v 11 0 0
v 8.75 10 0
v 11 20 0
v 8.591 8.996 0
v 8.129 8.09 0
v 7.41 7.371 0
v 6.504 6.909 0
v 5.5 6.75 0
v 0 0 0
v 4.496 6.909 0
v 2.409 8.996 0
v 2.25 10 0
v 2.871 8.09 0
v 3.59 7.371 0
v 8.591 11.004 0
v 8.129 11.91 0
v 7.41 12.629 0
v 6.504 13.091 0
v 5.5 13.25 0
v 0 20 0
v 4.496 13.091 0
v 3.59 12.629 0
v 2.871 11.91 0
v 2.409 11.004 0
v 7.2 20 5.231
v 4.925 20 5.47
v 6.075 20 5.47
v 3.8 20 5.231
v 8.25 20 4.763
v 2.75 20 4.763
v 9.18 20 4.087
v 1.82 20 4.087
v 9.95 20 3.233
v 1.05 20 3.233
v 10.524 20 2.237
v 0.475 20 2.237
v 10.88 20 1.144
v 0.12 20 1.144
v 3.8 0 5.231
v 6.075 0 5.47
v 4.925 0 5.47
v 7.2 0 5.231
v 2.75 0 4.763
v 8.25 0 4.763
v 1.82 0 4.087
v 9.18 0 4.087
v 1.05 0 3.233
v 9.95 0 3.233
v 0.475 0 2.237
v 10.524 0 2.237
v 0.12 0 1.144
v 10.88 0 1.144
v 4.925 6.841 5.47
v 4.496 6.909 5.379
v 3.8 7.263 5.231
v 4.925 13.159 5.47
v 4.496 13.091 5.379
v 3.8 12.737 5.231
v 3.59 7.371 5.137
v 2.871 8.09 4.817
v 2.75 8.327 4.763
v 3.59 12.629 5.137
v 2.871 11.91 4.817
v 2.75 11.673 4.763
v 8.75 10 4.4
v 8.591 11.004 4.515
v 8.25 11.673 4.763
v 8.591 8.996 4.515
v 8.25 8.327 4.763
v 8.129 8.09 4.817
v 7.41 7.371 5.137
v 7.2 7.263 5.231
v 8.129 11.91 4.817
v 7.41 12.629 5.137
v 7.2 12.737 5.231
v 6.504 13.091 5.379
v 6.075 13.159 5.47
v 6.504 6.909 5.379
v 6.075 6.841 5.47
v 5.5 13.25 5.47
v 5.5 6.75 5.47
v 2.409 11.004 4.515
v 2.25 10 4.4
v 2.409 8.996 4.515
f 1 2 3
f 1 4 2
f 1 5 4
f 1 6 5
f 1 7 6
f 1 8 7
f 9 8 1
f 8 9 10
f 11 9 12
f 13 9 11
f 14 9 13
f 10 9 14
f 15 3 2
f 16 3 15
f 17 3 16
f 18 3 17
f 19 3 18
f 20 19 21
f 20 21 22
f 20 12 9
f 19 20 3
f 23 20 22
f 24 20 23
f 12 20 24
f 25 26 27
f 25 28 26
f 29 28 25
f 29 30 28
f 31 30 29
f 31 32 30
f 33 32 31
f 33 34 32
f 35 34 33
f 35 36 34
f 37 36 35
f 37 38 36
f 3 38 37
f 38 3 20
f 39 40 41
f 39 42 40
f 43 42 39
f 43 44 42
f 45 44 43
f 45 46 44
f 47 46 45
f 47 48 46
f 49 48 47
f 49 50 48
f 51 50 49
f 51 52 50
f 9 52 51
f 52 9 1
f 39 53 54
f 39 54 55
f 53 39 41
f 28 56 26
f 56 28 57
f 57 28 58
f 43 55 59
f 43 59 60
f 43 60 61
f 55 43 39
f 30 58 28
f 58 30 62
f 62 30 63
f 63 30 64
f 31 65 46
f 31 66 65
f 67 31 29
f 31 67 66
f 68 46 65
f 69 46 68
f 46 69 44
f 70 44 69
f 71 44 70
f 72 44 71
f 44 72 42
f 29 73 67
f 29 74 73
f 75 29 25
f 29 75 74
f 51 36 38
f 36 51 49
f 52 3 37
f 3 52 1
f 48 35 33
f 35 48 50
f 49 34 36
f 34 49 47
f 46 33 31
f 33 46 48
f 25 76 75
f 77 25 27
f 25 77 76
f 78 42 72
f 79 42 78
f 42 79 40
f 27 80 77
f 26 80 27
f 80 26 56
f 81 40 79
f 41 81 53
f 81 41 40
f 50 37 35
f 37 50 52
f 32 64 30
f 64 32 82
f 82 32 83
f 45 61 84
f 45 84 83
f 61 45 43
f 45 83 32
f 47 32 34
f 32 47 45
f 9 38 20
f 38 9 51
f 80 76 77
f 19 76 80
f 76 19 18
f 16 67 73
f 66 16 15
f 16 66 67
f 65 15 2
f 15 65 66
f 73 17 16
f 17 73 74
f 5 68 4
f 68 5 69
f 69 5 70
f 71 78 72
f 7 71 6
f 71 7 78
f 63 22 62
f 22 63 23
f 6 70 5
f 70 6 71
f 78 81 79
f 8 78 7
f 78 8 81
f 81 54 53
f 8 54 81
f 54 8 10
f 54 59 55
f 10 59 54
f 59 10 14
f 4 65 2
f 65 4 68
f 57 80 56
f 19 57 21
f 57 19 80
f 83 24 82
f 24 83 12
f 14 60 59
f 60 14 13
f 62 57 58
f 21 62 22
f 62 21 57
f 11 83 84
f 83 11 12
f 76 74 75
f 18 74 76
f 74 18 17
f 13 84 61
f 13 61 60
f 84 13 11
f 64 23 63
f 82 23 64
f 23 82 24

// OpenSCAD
// preview[view:south west, tilt:diagonal]
/* [General] */

part="vclamp_rod"; // [clamp_tray:Clamp Tray,rod_tray:Rod Dray,dual_tray:Dual Tray,hclamp:Flat(H) Clamp,vclamp:V-Clamp,tvclamp:Tall V-Clamp,vclamp_rod:V-Clamp Rod,presser:Presser,grip:Grip,preview:Preview All]
// Bolt Diameter
boltd=6.0; // [3:M3,4:M4,5:M5,6:M6,7:M7,8:M8,3.175:1/8",4.7625:3/16",6.35:1/4",7.9375:5/16",9.525:3/8",11.1125:7/16",12.7:1/2"]

/* [Flat Clamp] */

// Flat Clamp Width (X)
hcw=80; // [40:120]
// Flat Clamp Height (Y)
hch=20; // [10:40]
// Flat Clamp Depth (Z)
hcd=6; // [4:0.1:20]
// Flat Clamp Extra Notch
hnotch=1; // [1:Yes,2:No]

/* [V-Clamp] */

// V-Clamp Width (X)
vcw=76; // [40:120]
// V-Clamp Height (Y)
vch=20; // [10:40]
// V-Clamp Depth
vcd=16; // [10:0.1:40]
// V-Clamp Rod diameter
vcrd=12; // [10:20]

/* [Others] */

// Clamp Tray Count
ctray_count=12; // [1:20]

// Grip Big Diameter
gripd=40; // [20:60]

if(part=="clamp_tray")
    clamp_tray();
else if(part=="dual_tray")
{
  clamp_tray();
  translate([ctray_count*9,0])
    m4_tray(left=0);
} else if(part=="rod_tray") {
  m4_tray();
} else if(part=="vclamp_rod") {
  vclamp_rod();
} else if(part=="hclamp")
{
  translate([0,0,hcd]) mirror([0,0,1]) hclamp();
} else if(part=="vclamp")
{
  translate([0,0,vch]) rotate([-90,0])
  vclamp();
} else if(part=="tvclamp") {
   rotate([90,0]) tvclamp();
} else if(part=="presser") {
  mirror([0,0,1]) presser();
} else if(part=="grip")
{
  grip(gripd);
} else if(part=="preview")
{
  color("lightblue") clamp_tray();
  color("lightgreen") translate([ctray_count*9,0]) m4_tray(left=0);
  color("yellow") for(x=[0:(ctray_count-1)/2-2]) {
    translate([8.5+x*9,2.5,hcw+2]) rotate([0,-90,0]) mirror([1,0]) hclamp();
  }
  color("red") for(x=[0:2]) {
    translate([((ctray_count-1)/2-2)*9+20+x*18,2.5,2.5]) rotate([0,-78]) vclamp();
  }
  for(x=[0:1:4],y=[0:1]) {
    if(x%2!=y%2)
    translate([ctray_count*9+6+x*10,6+y*12])
    {
      color("silver") cylinder(d=4,h=50,$fn=20);
      translate([0,0,25+x*5+y*10-(x==4?5:0)])
      {
        color("gray") mirror([0,0,1]) rotate([0,0,30]) grip();
        if(x>2)
          color("pink") translate([(vcrd-1)*-.5,vch*-.5,-15]) mirror([0,0,1]) vclamp_rod();
      }
    }
  }
}
module clamp_tray() {
  difference() {
    box([2+ctray_count*9,25,20],bottom=0,r=2);
    for(x=[0:ctray_count-1]) {
      translate([2+x*9,2,2]) cube([7,21,20]);
    }
  }
}  
module m4_tray(left=1) {
  difference(){
    union(){
      translate([0,0]) box([52,25,18],left=left,bottom=0,r=2);
      *translate([115,0,4]) {
        for(x=[0:6],y=[0:1]){
          translate([x*10,6+y*12]) cylinder(d=7,h=16,$fn=20);
        }
      }
    }
    translate([6,0,4]) {
      for(x=[0:4],y=[0:1]){
        translate([x*10,6+y*12]) cylinder(d=boltd+.5,h=20,$fn=20);
      }
    }
  }
}
module presser() {
  difference(){
    union() {
      sphere(d=13+boltd,$fn=50);
    }
    translate([0,0,boltd>5?-2:0])
      cylinder(d=boltd+.2,h=20,$fn=20);
    translate([0,0,boltd>5?1:3])
      cylinder(d=boltd*2+.2,h=30,$fn=6);
    translate([-10,-10,5])
      cube(20);
  }
}
module tvclamp() {
  tvh=48;
  difference(){
    union() {
      box([vcw-20,vcd,4],front=0);
      translate([vcw-24,0]) box([4,vcd,tvh],front=0);
      translate([vcw-24,0,tvh-5]) box([24,vcd,5],front=0);
      translate([vcw-24,0,tvh-24]) intersection() {
        rotate([0,-45]) box([40,2,40],r=1,front=0);
          box([24,2,24],r=1,front=0);
      }
      translate([vcw-60,0,0]) intersection() {
        rotate([0,45]) box([60,2,60],r=1,front=0);
          box([40,2,40],r=1,front=0);
      }
    }
    *translate([vcw-20,-.01,tvh-4])
      rotate([0,90,0]) cube([80,vcd+.02,30]);
    *translate([-.01,-.01,4]) cube([50,vcd+.02,80]);
    translate([vcw-vcd/2,vcd/2,0]) {
      cylinder(d=4,h=tvh+.02,$fn=20);
      translate([0,0,tvh-5]) rotate([0,0,30]) cylinder(d=8.2,h=3,$fn=6);
    }
    for(x=[vcd/2:16:44]) {
      translate([x,vcd/2,-.01]) cylinder(d=4,h=5,$fn=20);
    }
  }
  %translate([vcw-vcd/2,vcd/2,tvh-15]) presser();
}
module box(size,r=1,top=1,bottom=1,left=1,right=1,front=1,back=1)
{
  w=size[0];
  d=size[1];
  h=size[2];
  intersection(){
    cube([w,d,h]);
    minkowski(){
      translate([left?r:0,front?r:0,bottom?r:0]) cube([w-(left?r:0)-(right?r:0),d-(front?r:0)-(back?r:0),h-(top?r:0)-(bottom?r:0)]);
      sphere(r,$fn=30);
    }
  }
}
module rounded_rect(w,h,r) {
  translate([r,r]) circle(d=r*2,$fn=30);
  translate([r,h-r]) circle(d=r*2,$fn=30);
  translate([w-r,h-r]) circle(d=r*2,$fn=30);
  translate([w-r,r]) circle(d=r*2,$fn=30);
  translate([r,0]) square([w-r*2,h]);
  translate([0,r]) square([r,h-r*2]);
  translate([w-r,r]) square([r,h-r*2]);
}
module rounded_cube(dims,rsides=2,rvert=0)
{
  w=dims[0];
  h=dims[1];
  d=dims[2];
  if(rvert==0)
  {
    linear_extrude(d) rounded_rect(w,h,rsides);
  } else {
    translate([rsides,rsides,rvert]) scale([1,1,rvert/rsides]) minkowski() {
      cube([w-rsides*2,h-rsides*2,(d-rvert*2)/(rvert/rsides)]);
      sphere(rsides,$fn=30);
    }
  }
}
module hclamp() {
  difference(){
    rounded_cube([hcw,hch,hcd],8);
    translate([3+boltd,-.01]) mirror([1,0]) rotate([0,60]) cube([10,hch+.02,20]);
    if(hnotch)
      translate([-.01,-.01,hcd-1]) mirror([0,0,1]) cube([3,hch,hcd]);
    translate([0,3,-.01]) mirror([0,1,0]) rotate([0,0,10]) cube(20);
    translate([0,hch-3,-.01]) rotate([0,0,10]) cube(20);
    translate([5+boltd,hch/2-boltd/2-.2,-.01]) rounded_cube([hcw-13-boltd*2,boltd+.4,8.02],boltd/2);
    translate([hcw-8,hch/2,-.01]) cylinder(d=boltd+.4,h=8.02,$fn=20);
  }
}
module vclamp() {
  difference(){
    translate([0,vch]) rotate([90,0]) rounded_cube([vcw,vcd,vch],rsides=2,rvert=0);
    
    translate([0,-.01,1]) rotate([0,-18,0]) cube([vcw,vch+.02,vcd]);
    translate([vcw*2/3,0,0]) {
      translate([vcrd/2-.5,-.01,vcd]) rotate([0,35]) cube([vcw,vch+.02,vcd]);
      translate([0,-.01,vcd]) rotate([-90,0]) cylinder(d=vcrd,h=vch+.02,$fn=30);
      translate([0,-.01,vcd-vcrd/2-4]) mirror([0,0,1]) rotate([0,-15,0]) cube([vcw,vch+.02,vcd]);
      translate([0,-.01,vcd-vcrd/2-4]) mirror([0,0,1]) mirror([1,0]) rotate([0,-7,0]) cube([vcw,vch+.02,vcd]);
      for(r=[-35:5:50])
        translate([0,vch/2,vcd-.01]) rotate([0,r]) translate([0,0,vcd*-2]) cylinder(d=boltd+.5,h=vch+vcd,$fn=20);
    }
  }
}
module vclamp_rod() {
  difference(){
    intersection(){
      cube([vcrd-1,vch,(vcrd-1)/2]);
      translate([(vcrd-1)/2,0]) rotate([-90,0]) cylinder(d=vcrd-1,h=vch,$fn=30);
    }
    translate([(vcrd-1)/2,vch/2,-.01]) cylinder(d=boltd+.5,h=vch,$fn=20);
  }
}
module grip(od=gripd,md=boltd)
{
  nuth=(boltd==4?3:(boltd>8?6:4));  
  nutdia = md*2-0.2; // original: md*2+.2, could be more snug
  echo("Nut dimensions:", md, nuth, nutdia);
    
  difference(){
    union(){
      cylinder(d=od,h=nuth+1,$fn=6);
      translate([0,0,nuth+1]) cylinder(d1=18,d2=12,h=3,$fn=30);
      translate([0,0,nuth+3]) cylinder(d=12,h=nuth*2,$fn=30);
      for(d=[0:60:330])
        rotate([0,0,d]) translate([od/2,0]) cylinder(d=od/5,h=nuth+1,$fn=30);
    }
    // nut
    translate([0,0,-.01]) cylinder(d=nutdia,h=nuth+.2,$fn=6);
    // screw hole
    translate([0,0,-.01]) cylinder(d=md+.5,h=40.02,$fn=20);
    for(d=[30:60:330])
      rotate([0,0,d]) translate([od/2,0,-.01]) cylinder(d=od/3,h=nuth+1.02,$fn=30);
  }
}
